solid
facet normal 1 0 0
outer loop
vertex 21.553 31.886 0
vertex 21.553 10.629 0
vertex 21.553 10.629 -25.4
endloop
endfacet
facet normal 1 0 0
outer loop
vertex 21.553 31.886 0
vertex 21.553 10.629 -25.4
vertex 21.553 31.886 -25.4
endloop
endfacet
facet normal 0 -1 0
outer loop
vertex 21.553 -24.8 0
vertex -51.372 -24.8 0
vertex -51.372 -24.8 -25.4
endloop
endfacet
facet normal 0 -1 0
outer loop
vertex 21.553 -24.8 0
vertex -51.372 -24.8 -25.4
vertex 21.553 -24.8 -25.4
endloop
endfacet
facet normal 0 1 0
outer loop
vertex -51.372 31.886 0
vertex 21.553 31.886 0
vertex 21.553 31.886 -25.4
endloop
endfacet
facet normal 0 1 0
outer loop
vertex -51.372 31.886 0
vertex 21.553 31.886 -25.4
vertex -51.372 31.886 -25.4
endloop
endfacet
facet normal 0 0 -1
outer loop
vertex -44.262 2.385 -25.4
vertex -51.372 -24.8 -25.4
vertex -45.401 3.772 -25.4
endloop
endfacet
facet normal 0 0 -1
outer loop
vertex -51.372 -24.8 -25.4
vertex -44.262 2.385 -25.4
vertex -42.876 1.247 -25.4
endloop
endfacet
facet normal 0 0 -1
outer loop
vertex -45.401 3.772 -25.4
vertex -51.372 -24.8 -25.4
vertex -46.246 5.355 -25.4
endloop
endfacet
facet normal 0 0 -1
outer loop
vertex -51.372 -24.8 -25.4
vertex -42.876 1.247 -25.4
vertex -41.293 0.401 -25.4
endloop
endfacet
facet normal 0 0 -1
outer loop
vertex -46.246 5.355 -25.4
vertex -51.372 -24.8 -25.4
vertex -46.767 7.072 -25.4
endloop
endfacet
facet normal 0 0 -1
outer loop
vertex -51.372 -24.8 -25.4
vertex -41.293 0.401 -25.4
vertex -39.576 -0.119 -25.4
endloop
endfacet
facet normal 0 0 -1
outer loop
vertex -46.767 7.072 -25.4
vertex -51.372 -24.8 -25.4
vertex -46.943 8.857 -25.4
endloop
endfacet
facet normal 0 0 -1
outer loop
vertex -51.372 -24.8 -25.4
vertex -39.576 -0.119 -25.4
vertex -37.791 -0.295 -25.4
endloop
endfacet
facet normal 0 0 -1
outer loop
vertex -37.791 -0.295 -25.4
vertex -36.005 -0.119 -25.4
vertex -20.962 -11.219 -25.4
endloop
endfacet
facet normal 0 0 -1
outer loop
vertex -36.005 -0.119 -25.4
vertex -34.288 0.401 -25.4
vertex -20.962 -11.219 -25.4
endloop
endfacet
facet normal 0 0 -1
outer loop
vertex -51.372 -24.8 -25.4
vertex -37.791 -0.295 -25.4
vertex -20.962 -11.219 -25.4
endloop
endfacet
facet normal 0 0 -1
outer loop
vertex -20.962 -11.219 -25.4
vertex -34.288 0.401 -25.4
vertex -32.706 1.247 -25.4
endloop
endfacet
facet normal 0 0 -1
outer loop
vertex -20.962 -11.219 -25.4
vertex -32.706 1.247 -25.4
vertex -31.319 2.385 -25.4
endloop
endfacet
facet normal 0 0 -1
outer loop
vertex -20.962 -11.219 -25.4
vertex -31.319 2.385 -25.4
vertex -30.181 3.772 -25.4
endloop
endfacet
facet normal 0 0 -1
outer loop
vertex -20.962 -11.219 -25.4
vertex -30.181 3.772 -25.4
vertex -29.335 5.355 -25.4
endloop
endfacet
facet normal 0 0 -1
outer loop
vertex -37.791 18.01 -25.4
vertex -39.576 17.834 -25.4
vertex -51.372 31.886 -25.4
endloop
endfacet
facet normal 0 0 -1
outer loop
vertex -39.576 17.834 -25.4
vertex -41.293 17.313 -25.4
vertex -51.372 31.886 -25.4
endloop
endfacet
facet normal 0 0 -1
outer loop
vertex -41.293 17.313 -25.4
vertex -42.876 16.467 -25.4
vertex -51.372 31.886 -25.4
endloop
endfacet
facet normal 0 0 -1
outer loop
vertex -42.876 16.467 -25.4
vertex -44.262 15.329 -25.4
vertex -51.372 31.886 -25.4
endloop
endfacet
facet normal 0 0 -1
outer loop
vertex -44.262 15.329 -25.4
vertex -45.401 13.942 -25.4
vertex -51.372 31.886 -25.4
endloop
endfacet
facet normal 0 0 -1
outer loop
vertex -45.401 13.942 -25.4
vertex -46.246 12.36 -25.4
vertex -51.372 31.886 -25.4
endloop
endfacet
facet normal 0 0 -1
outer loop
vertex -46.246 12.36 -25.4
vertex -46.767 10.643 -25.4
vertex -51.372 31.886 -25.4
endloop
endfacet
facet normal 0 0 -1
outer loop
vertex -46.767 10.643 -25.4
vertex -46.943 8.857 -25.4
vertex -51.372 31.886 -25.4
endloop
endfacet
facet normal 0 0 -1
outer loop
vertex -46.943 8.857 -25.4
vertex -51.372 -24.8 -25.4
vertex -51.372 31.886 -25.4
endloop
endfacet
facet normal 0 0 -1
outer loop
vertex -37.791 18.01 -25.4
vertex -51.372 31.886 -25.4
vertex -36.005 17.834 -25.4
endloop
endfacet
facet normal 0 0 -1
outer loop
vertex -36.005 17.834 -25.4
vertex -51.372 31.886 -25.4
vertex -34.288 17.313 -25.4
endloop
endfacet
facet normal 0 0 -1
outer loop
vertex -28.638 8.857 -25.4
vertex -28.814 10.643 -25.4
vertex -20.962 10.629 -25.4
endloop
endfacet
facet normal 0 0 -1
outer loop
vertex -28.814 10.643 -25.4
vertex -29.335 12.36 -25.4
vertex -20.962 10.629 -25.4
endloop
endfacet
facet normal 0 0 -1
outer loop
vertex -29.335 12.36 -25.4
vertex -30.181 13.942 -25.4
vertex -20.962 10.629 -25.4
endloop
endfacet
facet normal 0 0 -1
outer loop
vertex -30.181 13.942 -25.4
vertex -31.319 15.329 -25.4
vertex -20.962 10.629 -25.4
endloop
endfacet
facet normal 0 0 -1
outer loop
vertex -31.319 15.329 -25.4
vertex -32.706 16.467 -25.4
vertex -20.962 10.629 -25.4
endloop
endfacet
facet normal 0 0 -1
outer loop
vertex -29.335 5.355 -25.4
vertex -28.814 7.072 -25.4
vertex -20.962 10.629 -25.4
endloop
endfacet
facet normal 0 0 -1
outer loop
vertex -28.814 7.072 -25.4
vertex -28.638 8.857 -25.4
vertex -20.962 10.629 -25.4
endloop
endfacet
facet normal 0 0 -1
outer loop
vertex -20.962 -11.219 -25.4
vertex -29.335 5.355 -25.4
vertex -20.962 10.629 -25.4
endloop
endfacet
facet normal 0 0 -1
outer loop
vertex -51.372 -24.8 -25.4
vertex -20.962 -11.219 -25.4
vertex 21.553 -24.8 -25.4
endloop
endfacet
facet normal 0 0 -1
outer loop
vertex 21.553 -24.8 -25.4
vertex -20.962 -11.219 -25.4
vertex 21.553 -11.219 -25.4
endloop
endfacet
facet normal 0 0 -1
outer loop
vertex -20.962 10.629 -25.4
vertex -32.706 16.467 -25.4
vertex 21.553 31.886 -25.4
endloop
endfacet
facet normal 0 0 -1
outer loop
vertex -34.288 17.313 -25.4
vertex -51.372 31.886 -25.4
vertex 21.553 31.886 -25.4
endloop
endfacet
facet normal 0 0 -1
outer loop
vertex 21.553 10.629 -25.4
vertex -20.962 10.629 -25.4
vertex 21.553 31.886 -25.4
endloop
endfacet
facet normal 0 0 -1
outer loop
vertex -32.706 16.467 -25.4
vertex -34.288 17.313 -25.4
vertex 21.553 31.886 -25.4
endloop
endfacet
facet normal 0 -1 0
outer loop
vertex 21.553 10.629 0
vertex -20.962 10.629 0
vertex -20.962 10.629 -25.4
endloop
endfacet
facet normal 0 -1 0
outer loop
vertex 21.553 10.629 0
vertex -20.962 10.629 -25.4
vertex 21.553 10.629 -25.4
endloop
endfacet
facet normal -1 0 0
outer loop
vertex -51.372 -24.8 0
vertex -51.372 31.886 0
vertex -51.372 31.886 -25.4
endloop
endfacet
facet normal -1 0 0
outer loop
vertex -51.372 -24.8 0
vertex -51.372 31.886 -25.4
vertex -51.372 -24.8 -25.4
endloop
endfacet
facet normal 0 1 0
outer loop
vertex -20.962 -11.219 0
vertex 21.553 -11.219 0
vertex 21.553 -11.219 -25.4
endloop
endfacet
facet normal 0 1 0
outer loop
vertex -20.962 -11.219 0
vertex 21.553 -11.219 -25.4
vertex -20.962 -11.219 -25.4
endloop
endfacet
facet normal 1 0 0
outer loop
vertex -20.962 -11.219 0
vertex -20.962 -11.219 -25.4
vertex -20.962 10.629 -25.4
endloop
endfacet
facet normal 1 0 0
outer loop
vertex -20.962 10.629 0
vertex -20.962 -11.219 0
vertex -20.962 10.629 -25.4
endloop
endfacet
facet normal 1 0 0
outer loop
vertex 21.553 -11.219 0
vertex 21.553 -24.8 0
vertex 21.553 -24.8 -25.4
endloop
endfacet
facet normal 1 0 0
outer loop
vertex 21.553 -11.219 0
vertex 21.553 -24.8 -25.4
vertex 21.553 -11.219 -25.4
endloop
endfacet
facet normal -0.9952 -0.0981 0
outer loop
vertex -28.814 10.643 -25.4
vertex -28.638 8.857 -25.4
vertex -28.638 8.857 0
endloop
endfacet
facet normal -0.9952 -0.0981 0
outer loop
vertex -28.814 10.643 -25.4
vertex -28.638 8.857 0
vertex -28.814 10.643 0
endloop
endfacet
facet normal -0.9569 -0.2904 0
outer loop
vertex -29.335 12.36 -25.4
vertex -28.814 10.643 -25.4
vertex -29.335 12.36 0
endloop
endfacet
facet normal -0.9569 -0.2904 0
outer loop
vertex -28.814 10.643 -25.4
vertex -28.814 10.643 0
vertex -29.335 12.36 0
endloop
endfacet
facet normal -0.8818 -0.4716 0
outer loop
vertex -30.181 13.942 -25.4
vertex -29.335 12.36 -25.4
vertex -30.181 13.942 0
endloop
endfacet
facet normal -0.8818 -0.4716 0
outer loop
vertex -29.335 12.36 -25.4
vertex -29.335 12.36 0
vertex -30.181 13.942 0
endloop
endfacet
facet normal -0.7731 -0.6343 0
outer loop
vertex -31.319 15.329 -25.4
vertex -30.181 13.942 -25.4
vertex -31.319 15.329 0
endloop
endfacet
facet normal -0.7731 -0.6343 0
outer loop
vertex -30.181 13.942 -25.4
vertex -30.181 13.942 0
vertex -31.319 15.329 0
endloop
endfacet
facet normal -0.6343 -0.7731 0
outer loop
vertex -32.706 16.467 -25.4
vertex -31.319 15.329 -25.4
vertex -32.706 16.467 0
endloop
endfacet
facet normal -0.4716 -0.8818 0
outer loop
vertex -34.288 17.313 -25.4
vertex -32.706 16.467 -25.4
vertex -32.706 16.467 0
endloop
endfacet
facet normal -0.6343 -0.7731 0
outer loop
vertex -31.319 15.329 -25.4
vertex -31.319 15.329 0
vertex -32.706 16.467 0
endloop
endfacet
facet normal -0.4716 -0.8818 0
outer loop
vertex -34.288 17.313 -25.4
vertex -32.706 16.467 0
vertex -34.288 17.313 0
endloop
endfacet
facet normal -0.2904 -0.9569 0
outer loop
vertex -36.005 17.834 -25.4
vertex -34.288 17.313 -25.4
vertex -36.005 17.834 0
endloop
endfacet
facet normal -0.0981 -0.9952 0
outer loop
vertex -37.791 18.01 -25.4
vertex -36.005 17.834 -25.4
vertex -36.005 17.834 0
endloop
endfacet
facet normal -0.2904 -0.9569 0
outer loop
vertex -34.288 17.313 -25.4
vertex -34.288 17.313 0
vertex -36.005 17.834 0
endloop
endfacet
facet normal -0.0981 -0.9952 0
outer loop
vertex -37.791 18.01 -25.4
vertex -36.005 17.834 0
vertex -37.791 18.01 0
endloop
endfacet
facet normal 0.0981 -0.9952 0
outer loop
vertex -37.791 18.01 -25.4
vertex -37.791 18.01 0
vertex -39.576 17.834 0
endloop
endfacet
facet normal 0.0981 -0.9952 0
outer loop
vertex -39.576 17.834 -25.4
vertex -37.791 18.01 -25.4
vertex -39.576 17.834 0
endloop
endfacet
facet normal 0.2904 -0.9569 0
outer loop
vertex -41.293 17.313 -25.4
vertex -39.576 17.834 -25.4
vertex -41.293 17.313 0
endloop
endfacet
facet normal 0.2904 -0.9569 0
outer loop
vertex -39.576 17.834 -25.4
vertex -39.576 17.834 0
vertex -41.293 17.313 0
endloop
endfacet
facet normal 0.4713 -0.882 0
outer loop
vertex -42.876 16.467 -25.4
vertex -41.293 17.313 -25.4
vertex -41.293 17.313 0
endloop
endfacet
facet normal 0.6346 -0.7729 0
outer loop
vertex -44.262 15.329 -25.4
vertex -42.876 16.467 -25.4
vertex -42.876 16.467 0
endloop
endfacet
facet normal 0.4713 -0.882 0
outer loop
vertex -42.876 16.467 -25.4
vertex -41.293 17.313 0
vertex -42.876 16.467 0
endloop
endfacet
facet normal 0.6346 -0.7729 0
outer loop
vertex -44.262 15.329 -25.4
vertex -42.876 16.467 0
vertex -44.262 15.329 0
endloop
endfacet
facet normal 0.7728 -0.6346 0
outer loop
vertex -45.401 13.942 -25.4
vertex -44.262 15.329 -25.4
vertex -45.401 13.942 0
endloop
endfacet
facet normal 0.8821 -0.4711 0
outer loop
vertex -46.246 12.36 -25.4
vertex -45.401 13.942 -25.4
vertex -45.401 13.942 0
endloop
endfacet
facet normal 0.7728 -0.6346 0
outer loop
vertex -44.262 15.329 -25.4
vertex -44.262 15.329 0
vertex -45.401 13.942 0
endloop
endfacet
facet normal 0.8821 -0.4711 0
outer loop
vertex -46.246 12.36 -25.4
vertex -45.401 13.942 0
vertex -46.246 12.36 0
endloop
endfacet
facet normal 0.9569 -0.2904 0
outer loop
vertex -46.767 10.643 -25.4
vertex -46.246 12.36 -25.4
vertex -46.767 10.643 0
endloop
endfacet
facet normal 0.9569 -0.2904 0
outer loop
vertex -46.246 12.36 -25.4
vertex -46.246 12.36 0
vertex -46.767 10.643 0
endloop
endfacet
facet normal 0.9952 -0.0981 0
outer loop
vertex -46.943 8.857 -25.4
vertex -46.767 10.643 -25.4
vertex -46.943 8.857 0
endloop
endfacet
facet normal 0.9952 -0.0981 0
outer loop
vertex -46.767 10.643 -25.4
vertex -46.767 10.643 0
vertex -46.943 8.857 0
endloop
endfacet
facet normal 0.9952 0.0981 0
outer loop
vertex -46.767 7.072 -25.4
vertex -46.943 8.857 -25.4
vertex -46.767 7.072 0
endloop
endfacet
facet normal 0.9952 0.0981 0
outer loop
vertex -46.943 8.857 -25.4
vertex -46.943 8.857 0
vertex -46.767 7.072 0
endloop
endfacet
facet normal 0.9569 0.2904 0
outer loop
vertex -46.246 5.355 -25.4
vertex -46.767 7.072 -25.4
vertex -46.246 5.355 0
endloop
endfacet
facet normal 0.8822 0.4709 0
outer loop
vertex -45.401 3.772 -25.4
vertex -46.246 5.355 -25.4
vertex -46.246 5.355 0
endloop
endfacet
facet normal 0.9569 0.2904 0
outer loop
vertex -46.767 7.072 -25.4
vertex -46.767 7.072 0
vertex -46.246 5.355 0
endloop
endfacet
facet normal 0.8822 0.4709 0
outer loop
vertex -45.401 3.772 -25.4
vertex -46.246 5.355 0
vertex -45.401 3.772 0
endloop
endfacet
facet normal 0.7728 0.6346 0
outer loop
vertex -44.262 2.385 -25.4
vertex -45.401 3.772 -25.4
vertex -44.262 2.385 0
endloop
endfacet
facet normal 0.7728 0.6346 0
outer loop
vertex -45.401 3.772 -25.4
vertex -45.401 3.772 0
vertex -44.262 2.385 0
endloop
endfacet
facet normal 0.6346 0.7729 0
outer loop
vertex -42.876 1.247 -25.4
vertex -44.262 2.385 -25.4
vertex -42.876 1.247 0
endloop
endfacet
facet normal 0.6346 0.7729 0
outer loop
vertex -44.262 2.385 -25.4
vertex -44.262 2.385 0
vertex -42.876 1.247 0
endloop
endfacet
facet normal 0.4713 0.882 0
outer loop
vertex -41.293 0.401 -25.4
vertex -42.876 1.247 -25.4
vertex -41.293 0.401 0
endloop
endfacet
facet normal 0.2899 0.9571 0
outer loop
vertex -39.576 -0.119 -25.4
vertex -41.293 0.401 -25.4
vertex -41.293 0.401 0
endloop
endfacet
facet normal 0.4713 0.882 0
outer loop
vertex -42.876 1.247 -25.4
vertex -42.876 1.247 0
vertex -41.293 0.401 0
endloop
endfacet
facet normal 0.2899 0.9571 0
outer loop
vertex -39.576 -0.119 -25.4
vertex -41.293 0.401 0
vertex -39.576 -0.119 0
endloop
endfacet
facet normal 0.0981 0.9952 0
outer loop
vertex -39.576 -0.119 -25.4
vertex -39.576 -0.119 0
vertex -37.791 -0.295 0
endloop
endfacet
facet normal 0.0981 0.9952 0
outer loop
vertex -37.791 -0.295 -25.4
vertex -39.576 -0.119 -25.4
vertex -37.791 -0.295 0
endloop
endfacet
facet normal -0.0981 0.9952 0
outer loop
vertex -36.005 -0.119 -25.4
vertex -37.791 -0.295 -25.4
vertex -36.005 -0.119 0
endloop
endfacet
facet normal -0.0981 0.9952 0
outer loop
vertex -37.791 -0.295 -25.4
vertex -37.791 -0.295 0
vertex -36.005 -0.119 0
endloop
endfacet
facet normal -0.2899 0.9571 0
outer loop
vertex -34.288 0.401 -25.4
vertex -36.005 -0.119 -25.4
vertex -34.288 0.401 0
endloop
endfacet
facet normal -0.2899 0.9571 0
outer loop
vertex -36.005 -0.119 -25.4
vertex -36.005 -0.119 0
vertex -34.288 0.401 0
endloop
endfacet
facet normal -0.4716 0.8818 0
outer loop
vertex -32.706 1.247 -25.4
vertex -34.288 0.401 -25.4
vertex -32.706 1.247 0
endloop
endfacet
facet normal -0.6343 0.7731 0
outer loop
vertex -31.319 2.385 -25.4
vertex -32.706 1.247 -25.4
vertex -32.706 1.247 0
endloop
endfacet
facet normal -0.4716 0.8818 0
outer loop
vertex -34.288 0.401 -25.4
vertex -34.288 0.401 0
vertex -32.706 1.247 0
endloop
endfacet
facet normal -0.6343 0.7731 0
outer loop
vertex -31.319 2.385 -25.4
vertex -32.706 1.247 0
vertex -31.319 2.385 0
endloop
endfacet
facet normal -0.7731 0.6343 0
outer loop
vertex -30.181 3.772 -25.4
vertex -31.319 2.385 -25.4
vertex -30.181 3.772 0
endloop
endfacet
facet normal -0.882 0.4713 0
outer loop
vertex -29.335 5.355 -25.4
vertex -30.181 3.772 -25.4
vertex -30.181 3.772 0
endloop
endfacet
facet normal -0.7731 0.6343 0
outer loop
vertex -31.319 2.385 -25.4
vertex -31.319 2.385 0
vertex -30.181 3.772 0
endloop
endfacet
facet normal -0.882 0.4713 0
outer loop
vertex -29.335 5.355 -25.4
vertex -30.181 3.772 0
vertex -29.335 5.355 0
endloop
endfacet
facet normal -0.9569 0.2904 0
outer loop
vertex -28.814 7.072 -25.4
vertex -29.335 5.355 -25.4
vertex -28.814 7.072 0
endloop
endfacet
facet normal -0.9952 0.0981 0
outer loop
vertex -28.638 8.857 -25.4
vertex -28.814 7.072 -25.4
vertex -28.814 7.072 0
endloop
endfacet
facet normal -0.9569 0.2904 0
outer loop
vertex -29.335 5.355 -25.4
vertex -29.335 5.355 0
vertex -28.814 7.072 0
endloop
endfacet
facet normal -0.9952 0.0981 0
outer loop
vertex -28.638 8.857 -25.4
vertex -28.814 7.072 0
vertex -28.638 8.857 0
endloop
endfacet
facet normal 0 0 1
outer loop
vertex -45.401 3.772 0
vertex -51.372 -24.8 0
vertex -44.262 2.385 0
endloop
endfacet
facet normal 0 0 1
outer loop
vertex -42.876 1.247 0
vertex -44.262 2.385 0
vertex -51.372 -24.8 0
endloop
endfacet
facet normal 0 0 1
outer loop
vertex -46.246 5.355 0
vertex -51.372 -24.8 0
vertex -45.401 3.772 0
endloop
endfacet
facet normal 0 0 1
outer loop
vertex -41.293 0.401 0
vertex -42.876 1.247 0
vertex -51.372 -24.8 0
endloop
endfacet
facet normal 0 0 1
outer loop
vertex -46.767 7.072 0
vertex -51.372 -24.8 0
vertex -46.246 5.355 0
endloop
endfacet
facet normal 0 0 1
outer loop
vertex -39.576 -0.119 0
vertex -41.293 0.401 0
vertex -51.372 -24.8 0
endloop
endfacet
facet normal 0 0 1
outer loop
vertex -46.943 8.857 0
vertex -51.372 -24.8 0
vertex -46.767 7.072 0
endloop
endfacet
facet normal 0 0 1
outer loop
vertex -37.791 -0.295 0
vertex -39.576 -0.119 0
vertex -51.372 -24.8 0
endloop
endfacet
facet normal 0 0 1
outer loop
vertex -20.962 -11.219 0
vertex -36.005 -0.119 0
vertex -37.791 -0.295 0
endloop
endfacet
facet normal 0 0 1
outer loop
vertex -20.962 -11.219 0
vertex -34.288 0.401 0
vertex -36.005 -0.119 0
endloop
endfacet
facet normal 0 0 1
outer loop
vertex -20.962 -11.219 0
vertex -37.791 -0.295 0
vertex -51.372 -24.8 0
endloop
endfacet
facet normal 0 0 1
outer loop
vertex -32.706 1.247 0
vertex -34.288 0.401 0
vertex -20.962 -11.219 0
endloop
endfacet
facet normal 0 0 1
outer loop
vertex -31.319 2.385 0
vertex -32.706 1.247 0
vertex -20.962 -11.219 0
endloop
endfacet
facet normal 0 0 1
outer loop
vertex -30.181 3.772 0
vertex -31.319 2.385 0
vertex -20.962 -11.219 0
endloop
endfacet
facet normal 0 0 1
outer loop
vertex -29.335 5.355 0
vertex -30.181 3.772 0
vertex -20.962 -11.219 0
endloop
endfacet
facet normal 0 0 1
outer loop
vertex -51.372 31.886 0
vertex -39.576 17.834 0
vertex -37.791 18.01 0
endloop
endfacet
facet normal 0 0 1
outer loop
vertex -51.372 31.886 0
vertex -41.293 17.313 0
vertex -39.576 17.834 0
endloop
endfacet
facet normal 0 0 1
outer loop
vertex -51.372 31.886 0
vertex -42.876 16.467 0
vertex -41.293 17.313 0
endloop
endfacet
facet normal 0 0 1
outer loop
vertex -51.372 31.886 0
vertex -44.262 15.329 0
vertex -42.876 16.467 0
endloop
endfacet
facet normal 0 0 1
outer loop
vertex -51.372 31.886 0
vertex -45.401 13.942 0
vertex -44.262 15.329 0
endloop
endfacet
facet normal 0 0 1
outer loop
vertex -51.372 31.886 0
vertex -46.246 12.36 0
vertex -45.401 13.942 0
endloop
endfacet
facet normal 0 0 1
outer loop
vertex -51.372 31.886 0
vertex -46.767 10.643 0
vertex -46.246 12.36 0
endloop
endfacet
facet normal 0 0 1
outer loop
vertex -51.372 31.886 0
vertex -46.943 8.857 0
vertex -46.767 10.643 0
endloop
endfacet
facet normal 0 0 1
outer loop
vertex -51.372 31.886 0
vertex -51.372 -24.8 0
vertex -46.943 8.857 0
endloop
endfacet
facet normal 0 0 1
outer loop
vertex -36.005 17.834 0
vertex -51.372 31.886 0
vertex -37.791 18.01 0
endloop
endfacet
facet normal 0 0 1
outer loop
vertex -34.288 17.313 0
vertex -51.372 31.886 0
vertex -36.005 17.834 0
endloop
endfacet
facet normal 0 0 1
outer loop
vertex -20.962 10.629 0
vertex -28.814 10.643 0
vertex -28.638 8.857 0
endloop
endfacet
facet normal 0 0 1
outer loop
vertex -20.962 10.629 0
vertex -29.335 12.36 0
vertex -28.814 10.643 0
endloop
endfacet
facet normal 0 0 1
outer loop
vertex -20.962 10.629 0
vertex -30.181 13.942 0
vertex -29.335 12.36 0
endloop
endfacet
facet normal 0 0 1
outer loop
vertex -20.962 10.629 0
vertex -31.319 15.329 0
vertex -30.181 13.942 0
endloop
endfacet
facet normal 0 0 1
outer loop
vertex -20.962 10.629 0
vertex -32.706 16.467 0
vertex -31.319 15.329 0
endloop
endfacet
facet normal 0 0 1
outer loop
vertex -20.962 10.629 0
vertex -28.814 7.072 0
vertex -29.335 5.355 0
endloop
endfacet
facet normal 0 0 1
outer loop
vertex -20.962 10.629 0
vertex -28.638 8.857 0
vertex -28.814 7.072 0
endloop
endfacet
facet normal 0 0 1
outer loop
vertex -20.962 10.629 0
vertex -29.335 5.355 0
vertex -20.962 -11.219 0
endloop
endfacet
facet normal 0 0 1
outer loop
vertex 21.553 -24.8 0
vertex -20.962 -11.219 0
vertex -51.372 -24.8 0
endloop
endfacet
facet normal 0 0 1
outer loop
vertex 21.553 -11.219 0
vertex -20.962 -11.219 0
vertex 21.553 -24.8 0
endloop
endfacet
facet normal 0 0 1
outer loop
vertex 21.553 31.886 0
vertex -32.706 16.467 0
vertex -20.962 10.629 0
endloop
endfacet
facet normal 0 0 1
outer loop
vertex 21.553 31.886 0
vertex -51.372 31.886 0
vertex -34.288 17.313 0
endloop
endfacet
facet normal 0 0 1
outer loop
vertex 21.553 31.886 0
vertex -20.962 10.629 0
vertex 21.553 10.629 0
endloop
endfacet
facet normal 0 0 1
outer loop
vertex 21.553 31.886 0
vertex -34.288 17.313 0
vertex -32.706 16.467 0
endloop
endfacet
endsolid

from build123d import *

# Parameters (mm, degrees)
F0_R     = 9.152436
F1_DEPTH = 25.4


with BuildPart() as f1:
    # F0 (on Top) → F1 (new body)
    with BuildSketch(Plane.XY):
        Polygon((21.552509, 31.885903), (-51.371735, 31.885903), (-51.371735, -24.800148), (21.552509, -24.800148), (21.552509, -11.219114), (-20.96203, -11.219114), (-20.96203, 10.628635), (21.552509, 10.628635), align=None)
        with Locations((-37.790701, 8.857195)):
            Circle(F0_R, mode=Mode.SUBTRACT)
    extrude(amount=-F1_DEPTH)


solid = f1.part
